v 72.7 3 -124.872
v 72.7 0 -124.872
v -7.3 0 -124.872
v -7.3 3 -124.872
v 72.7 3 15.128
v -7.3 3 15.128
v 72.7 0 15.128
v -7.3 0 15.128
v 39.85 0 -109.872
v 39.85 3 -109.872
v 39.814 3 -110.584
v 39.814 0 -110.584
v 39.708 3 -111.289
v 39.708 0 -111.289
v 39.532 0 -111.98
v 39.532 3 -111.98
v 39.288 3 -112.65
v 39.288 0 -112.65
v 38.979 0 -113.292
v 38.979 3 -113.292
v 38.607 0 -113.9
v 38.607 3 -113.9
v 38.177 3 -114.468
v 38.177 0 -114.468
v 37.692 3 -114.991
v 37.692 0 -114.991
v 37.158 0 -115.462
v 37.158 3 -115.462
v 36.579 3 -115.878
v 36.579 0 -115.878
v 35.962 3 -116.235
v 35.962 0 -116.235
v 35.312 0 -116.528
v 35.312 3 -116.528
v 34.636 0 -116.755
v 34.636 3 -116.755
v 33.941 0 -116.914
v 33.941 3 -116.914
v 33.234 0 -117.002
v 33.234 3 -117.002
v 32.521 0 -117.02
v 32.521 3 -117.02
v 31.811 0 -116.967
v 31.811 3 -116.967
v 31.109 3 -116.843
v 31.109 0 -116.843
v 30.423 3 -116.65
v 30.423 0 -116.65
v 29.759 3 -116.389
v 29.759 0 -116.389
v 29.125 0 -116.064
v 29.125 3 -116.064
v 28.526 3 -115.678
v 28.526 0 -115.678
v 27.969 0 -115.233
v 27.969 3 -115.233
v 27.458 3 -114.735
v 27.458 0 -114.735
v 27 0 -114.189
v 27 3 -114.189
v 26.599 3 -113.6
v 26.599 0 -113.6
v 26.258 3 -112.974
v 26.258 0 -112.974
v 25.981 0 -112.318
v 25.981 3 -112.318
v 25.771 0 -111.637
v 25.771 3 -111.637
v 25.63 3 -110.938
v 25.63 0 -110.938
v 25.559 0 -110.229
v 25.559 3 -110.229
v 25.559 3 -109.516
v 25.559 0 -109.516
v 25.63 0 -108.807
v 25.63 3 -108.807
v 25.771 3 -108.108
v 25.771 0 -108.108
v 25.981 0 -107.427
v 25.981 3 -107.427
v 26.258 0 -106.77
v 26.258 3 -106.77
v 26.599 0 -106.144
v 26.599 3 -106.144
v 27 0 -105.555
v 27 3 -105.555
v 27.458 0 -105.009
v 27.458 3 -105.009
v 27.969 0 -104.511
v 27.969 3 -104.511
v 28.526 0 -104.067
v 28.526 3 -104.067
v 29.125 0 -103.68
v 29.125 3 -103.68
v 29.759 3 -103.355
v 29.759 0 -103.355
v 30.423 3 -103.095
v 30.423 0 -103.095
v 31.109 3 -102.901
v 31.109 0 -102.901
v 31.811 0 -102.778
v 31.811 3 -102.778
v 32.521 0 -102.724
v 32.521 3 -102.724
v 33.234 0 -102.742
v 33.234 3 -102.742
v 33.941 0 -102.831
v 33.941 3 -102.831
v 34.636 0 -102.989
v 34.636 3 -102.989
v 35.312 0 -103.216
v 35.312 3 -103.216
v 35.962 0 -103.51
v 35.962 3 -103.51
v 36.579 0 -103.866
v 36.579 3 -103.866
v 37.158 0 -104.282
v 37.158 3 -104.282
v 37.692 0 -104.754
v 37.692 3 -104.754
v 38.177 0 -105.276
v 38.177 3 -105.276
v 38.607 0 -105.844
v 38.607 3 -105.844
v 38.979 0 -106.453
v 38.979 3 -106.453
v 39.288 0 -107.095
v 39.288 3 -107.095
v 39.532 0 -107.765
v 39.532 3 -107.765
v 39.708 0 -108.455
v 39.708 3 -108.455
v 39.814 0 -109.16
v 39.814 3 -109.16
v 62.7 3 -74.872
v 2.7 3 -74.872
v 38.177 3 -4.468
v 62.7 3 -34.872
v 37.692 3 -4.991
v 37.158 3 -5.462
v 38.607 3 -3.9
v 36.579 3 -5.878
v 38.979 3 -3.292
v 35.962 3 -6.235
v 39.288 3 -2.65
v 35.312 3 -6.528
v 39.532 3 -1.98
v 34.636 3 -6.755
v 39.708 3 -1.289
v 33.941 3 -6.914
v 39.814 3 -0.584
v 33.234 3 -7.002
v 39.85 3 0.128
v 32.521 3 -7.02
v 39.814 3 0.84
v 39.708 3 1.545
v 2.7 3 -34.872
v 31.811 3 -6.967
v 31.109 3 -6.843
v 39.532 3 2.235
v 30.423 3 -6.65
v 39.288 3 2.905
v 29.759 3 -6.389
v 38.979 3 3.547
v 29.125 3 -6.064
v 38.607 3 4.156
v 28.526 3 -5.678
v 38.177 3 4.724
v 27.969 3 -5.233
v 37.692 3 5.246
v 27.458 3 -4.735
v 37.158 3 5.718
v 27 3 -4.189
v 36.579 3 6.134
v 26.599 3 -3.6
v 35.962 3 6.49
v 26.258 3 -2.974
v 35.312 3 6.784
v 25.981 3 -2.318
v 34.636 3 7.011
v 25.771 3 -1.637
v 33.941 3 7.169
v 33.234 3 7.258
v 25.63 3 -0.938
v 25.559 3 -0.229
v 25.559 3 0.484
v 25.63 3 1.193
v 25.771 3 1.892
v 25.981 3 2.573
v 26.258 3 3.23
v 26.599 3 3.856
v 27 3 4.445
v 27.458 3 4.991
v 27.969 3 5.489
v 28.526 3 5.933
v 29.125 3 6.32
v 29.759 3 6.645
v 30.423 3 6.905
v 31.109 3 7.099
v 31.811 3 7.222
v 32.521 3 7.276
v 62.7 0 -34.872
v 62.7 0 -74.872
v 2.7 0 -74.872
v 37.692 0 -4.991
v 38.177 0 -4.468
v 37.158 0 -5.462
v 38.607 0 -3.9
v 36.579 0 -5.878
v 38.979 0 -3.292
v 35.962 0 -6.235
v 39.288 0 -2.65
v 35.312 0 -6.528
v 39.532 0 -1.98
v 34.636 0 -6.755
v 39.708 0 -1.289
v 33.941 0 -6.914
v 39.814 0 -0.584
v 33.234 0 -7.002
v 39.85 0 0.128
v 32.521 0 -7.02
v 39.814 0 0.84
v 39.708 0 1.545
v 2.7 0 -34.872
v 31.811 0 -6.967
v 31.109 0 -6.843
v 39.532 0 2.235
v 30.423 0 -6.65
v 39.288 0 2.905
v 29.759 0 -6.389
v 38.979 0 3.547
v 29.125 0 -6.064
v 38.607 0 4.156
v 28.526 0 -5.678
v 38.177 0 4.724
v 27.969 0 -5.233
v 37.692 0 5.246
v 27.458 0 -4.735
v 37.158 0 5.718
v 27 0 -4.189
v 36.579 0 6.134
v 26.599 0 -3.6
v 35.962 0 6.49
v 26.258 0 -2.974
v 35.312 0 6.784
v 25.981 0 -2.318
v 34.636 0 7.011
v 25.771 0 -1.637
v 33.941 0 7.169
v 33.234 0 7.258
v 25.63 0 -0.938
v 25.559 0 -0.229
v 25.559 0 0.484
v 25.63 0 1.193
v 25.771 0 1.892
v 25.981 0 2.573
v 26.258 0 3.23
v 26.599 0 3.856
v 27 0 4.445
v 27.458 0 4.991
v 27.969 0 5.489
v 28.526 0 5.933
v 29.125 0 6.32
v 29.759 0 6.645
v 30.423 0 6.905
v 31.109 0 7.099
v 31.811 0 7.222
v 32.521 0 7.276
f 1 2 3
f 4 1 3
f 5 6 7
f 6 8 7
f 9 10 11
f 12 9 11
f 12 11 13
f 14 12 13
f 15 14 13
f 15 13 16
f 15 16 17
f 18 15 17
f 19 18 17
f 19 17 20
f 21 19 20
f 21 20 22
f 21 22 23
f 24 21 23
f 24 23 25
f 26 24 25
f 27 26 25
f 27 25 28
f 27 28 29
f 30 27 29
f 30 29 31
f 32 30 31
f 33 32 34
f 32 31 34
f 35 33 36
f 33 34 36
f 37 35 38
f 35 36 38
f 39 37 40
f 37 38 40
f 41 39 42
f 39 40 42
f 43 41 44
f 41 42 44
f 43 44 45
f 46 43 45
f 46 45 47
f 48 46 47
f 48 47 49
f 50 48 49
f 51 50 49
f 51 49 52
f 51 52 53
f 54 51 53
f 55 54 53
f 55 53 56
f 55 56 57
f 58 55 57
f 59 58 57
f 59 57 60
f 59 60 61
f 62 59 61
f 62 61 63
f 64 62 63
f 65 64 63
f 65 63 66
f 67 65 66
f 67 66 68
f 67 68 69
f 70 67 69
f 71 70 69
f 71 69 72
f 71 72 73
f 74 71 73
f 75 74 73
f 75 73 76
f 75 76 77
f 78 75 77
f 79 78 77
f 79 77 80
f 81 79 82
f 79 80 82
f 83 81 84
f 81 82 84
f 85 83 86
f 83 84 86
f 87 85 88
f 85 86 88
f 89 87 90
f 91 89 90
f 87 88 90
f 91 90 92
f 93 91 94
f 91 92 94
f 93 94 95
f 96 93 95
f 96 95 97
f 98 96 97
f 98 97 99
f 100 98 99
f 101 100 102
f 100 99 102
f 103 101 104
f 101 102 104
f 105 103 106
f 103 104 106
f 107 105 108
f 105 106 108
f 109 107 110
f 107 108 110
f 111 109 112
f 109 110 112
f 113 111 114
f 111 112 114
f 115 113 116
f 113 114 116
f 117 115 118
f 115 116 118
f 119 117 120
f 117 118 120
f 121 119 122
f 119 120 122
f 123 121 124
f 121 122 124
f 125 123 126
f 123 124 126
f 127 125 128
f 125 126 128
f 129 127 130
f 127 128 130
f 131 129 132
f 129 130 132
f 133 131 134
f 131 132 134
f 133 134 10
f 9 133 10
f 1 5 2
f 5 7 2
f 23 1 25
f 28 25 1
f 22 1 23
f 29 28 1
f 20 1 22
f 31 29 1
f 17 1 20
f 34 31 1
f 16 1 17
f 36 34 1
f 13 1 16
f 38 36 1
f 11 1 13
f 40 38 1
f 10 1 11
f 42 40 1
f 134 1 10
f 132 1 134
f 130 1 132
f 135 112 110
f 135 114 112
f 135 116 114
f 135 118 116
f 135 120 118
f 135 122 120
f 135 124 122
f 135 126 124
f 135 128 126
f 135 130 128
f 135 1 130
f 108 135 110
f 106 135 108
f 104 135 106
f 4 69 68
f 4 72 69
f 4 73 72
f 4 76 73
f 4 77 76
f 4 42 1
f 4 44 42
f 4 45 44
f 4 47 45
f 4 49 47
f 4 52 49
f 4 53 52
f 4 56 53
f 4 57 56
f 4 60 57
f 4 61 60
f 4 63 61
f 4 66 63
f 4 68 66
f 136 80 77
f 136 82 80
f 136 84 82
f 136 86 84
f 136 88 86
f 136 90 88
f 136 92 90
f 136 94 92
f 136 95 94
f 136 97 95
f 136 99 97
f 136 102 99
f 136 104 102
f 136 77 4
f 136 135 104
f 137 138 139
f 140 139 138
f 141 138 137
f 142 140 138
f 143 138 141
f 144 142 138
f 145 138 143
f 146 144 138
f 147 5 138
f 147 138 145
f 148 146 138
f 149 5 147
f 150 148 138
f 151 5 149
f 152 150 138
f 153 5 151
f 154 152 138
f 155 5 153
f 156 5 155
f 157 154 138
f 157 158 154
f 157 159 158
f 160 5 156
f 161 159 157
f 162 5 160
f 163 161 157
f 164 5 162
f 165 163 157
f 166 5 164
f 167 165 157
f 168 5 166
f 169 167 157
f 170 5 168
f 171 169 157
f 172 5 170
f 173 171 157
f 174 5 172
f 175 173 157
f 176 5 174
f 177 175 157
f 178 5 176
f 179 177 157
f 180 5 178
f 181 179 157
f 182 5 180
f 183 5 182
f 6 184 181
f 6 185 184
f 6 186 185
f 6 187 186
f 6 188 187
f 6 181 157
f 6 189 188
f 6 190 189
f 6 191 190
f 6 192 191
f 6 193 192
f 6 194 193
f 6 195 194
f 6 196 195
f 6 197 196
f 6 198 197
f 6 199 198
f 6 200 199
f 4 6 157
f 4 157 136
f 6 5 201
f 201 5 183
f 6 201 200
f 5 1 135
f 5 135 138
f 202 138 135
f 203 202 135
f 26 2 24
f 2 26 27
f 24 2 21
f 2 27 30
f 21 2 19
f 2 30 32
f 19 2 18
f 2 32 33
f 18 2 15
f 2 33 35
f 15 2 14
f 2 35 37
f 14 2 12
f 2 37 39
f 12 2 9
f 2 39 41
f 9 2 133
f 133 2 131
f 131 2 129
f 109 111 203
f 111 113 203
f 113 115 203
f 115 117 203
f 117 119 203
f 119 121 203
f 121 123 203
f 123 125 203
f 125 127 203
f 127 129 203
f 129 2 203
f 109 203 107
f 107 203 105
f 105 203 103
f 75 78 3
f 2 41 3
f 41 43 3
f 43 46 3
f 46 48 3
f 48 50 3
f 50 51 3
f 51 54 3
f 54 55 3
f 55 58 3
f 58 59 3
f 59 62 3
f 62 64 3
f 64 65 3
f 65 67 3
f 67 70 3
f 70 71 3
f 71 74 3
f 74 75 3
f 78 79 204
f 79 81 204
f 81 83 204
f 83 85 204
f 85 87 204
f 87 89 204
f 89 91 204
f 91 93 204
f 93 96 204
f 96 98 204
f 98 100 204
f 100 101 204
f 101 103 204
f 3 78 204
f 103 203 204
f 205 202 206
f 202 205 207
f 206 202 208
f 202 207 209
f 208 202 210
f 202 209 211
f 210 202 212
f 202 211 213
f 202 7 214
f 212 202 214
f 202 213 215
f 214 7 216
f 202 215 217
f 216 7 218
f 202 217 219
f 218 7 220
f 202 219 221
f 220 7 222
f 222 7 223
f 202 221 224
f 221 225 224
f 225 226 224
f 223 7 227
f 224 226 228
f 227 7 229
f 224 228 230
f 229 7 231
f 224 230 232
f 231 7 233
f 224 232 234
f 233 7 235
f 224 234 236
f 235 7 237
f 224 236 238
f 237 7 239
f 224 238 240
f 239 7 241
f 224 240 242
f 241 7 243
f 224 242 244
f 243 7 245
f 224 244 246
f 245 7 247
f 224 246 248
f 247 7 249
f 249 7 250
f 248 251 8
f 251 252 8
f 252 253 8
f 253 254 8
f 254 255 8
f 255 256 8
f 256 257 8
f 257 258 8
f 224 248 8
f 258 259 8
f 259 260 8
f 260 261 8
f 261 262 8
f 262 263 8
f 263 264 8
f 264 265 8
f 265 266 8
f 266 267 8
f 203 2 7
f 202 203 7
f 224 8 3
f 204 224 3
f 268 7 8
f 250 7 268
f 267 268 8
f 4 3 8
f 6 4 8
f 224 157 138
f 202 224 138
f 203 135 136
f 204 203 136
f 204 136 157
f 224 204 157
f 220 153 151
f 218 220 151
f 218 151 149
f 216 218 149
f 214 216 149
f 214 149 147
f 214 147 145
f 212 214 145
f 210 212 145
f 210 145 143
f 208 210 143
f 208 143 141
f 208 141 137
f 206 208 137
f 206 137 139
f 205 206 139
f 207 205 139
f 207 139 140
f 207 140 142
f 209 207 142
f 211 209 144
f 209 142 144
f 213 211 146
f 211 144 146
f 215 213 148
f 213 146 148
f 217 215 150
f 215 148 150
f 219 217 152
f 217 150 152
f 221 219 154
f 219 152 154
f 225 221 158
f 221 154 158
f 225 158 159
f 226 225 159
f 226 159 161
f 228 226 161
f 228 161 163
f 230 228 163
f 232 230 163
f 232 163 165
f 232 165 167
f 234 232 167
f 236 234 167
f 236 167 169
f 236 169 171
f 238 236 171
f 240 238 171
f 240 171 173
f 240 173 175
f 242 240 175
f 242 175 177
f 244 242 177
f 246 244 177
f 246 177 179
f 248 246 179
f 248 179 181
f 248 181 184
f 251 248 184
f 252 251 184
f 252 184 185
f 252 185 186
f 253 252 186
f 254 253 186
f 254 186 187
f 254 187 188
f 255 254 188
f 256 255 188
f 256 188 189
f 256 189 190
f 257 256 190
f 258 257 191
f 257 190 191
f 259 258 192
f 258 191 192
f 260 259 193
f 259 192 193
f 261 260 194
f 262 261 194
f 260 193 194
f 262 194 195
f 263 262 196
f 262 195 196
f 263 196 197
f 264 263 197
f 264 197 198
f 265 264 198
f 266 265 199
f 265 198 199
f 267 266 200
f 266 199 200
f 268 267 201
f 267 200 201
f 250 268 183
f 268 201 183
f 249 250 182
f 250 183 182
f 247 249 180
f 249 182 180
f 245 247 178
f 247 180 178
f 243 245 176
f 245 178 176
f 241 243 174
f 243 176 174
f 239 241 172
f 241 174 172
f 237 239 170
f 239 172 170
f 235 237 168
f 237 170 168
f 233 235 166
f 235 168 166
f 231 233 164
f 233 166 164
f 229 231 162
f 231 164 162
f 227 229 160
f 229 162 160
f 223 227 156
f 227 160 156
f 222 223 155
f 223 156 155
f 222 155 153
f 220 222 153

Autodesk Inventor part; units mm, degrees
ref_plane "YZ Plane" through (0, 0, 0) normal (1, 0, 0) x (0, 1, 0)
ref_plane "XZ Plane" through (0, 0, 0) normal (0, 1, 0) x (-1, 0, 0)
ref_plane "XY Plane" through (0, 0, 0) normal (0, 0, 1) x (1, 0, 0)
sketch "スケッチ1" plane through (0, 0, 0) normal (0, 1, 0) x (-1, 0, 0)
  line L0 (7.3003, 15.1278) -> (-72.6997, 15.1278)
  line L1 (-72.6997, 15.1278) -> (-72.6997, -124.8722)
  line L2 (-72.6997, -124.8722) -> (7.3003, -124.8722)
  line L3 (7.3003, -124.8722) -> (7.3003, 15.1278)
  point P0 (0, 0)
  dimension "d0" = 80
  dimension "d1" = 140
extrude "押し出し1" add sketch "スケッチ1" along normal blind 3
sketch "スケッチ2" plane through (0, 3, 0) normal (0, 1, 0) x (1, 0, 0)
  line L0 (2.6997, 34.8722) -> (62.6997, 34.8722)
  line L1 (62.6997, 34.8722) -> (62.6997, 74.8722)
  line L2 (62.6997, 74.8722) -> (2.6997, 74.8722)
  line L3 (2.6997, 74.8722) -> (2.6997, 34.8722)
  circle A0 centre (32.6997, -0.1278) radius 7.15
  circle A1 centre (32.6997, 109.8722) radius 7.15
  line L4 (-7.3003, -15.1278) -> (72.6997, -15.1278) projected
  line L5 (72.6997, 124.8722) -> (-7.3003, 124.8722) projected
  line L6 (-7.3003, 124.8722) -> (-7.3003, -15.1278) projected
  point P0 (0, 0)
  dimension "d4" = 60
  dimension "d5" = 40
  dimension "d6" = 14.3
  dimension "d7" = 14.3
  dimension "d8" = 15
  dimension "d9" = 15
  dimension "d10" = 40
  dimension "d11" = 40
  dimension "d12" = 10
  dimension "d13" = 50
extrude "押し出し2" cut sketch "スケッチ2" against normal blind 3
equation "\"BendRadius\" = Thickness"
equation "\"BendReliefWidth\" = Thickness"
equation "\"BendReliefDepth\" = 0.5 * Thickness"
equation "\"CornerReliefSize\" = 4 * Thickness"
equation "\"MinimumRemnant\" = 2 * Thickness"
equation "\"TransitionRadius\" = BendRadius"
equation "\"JacobiRadiusSize\" = BendRadius"
equation "\"GapSize\" = Thickness"
equation "\"Thickness\" = 0.5"
properties part number "came2"
